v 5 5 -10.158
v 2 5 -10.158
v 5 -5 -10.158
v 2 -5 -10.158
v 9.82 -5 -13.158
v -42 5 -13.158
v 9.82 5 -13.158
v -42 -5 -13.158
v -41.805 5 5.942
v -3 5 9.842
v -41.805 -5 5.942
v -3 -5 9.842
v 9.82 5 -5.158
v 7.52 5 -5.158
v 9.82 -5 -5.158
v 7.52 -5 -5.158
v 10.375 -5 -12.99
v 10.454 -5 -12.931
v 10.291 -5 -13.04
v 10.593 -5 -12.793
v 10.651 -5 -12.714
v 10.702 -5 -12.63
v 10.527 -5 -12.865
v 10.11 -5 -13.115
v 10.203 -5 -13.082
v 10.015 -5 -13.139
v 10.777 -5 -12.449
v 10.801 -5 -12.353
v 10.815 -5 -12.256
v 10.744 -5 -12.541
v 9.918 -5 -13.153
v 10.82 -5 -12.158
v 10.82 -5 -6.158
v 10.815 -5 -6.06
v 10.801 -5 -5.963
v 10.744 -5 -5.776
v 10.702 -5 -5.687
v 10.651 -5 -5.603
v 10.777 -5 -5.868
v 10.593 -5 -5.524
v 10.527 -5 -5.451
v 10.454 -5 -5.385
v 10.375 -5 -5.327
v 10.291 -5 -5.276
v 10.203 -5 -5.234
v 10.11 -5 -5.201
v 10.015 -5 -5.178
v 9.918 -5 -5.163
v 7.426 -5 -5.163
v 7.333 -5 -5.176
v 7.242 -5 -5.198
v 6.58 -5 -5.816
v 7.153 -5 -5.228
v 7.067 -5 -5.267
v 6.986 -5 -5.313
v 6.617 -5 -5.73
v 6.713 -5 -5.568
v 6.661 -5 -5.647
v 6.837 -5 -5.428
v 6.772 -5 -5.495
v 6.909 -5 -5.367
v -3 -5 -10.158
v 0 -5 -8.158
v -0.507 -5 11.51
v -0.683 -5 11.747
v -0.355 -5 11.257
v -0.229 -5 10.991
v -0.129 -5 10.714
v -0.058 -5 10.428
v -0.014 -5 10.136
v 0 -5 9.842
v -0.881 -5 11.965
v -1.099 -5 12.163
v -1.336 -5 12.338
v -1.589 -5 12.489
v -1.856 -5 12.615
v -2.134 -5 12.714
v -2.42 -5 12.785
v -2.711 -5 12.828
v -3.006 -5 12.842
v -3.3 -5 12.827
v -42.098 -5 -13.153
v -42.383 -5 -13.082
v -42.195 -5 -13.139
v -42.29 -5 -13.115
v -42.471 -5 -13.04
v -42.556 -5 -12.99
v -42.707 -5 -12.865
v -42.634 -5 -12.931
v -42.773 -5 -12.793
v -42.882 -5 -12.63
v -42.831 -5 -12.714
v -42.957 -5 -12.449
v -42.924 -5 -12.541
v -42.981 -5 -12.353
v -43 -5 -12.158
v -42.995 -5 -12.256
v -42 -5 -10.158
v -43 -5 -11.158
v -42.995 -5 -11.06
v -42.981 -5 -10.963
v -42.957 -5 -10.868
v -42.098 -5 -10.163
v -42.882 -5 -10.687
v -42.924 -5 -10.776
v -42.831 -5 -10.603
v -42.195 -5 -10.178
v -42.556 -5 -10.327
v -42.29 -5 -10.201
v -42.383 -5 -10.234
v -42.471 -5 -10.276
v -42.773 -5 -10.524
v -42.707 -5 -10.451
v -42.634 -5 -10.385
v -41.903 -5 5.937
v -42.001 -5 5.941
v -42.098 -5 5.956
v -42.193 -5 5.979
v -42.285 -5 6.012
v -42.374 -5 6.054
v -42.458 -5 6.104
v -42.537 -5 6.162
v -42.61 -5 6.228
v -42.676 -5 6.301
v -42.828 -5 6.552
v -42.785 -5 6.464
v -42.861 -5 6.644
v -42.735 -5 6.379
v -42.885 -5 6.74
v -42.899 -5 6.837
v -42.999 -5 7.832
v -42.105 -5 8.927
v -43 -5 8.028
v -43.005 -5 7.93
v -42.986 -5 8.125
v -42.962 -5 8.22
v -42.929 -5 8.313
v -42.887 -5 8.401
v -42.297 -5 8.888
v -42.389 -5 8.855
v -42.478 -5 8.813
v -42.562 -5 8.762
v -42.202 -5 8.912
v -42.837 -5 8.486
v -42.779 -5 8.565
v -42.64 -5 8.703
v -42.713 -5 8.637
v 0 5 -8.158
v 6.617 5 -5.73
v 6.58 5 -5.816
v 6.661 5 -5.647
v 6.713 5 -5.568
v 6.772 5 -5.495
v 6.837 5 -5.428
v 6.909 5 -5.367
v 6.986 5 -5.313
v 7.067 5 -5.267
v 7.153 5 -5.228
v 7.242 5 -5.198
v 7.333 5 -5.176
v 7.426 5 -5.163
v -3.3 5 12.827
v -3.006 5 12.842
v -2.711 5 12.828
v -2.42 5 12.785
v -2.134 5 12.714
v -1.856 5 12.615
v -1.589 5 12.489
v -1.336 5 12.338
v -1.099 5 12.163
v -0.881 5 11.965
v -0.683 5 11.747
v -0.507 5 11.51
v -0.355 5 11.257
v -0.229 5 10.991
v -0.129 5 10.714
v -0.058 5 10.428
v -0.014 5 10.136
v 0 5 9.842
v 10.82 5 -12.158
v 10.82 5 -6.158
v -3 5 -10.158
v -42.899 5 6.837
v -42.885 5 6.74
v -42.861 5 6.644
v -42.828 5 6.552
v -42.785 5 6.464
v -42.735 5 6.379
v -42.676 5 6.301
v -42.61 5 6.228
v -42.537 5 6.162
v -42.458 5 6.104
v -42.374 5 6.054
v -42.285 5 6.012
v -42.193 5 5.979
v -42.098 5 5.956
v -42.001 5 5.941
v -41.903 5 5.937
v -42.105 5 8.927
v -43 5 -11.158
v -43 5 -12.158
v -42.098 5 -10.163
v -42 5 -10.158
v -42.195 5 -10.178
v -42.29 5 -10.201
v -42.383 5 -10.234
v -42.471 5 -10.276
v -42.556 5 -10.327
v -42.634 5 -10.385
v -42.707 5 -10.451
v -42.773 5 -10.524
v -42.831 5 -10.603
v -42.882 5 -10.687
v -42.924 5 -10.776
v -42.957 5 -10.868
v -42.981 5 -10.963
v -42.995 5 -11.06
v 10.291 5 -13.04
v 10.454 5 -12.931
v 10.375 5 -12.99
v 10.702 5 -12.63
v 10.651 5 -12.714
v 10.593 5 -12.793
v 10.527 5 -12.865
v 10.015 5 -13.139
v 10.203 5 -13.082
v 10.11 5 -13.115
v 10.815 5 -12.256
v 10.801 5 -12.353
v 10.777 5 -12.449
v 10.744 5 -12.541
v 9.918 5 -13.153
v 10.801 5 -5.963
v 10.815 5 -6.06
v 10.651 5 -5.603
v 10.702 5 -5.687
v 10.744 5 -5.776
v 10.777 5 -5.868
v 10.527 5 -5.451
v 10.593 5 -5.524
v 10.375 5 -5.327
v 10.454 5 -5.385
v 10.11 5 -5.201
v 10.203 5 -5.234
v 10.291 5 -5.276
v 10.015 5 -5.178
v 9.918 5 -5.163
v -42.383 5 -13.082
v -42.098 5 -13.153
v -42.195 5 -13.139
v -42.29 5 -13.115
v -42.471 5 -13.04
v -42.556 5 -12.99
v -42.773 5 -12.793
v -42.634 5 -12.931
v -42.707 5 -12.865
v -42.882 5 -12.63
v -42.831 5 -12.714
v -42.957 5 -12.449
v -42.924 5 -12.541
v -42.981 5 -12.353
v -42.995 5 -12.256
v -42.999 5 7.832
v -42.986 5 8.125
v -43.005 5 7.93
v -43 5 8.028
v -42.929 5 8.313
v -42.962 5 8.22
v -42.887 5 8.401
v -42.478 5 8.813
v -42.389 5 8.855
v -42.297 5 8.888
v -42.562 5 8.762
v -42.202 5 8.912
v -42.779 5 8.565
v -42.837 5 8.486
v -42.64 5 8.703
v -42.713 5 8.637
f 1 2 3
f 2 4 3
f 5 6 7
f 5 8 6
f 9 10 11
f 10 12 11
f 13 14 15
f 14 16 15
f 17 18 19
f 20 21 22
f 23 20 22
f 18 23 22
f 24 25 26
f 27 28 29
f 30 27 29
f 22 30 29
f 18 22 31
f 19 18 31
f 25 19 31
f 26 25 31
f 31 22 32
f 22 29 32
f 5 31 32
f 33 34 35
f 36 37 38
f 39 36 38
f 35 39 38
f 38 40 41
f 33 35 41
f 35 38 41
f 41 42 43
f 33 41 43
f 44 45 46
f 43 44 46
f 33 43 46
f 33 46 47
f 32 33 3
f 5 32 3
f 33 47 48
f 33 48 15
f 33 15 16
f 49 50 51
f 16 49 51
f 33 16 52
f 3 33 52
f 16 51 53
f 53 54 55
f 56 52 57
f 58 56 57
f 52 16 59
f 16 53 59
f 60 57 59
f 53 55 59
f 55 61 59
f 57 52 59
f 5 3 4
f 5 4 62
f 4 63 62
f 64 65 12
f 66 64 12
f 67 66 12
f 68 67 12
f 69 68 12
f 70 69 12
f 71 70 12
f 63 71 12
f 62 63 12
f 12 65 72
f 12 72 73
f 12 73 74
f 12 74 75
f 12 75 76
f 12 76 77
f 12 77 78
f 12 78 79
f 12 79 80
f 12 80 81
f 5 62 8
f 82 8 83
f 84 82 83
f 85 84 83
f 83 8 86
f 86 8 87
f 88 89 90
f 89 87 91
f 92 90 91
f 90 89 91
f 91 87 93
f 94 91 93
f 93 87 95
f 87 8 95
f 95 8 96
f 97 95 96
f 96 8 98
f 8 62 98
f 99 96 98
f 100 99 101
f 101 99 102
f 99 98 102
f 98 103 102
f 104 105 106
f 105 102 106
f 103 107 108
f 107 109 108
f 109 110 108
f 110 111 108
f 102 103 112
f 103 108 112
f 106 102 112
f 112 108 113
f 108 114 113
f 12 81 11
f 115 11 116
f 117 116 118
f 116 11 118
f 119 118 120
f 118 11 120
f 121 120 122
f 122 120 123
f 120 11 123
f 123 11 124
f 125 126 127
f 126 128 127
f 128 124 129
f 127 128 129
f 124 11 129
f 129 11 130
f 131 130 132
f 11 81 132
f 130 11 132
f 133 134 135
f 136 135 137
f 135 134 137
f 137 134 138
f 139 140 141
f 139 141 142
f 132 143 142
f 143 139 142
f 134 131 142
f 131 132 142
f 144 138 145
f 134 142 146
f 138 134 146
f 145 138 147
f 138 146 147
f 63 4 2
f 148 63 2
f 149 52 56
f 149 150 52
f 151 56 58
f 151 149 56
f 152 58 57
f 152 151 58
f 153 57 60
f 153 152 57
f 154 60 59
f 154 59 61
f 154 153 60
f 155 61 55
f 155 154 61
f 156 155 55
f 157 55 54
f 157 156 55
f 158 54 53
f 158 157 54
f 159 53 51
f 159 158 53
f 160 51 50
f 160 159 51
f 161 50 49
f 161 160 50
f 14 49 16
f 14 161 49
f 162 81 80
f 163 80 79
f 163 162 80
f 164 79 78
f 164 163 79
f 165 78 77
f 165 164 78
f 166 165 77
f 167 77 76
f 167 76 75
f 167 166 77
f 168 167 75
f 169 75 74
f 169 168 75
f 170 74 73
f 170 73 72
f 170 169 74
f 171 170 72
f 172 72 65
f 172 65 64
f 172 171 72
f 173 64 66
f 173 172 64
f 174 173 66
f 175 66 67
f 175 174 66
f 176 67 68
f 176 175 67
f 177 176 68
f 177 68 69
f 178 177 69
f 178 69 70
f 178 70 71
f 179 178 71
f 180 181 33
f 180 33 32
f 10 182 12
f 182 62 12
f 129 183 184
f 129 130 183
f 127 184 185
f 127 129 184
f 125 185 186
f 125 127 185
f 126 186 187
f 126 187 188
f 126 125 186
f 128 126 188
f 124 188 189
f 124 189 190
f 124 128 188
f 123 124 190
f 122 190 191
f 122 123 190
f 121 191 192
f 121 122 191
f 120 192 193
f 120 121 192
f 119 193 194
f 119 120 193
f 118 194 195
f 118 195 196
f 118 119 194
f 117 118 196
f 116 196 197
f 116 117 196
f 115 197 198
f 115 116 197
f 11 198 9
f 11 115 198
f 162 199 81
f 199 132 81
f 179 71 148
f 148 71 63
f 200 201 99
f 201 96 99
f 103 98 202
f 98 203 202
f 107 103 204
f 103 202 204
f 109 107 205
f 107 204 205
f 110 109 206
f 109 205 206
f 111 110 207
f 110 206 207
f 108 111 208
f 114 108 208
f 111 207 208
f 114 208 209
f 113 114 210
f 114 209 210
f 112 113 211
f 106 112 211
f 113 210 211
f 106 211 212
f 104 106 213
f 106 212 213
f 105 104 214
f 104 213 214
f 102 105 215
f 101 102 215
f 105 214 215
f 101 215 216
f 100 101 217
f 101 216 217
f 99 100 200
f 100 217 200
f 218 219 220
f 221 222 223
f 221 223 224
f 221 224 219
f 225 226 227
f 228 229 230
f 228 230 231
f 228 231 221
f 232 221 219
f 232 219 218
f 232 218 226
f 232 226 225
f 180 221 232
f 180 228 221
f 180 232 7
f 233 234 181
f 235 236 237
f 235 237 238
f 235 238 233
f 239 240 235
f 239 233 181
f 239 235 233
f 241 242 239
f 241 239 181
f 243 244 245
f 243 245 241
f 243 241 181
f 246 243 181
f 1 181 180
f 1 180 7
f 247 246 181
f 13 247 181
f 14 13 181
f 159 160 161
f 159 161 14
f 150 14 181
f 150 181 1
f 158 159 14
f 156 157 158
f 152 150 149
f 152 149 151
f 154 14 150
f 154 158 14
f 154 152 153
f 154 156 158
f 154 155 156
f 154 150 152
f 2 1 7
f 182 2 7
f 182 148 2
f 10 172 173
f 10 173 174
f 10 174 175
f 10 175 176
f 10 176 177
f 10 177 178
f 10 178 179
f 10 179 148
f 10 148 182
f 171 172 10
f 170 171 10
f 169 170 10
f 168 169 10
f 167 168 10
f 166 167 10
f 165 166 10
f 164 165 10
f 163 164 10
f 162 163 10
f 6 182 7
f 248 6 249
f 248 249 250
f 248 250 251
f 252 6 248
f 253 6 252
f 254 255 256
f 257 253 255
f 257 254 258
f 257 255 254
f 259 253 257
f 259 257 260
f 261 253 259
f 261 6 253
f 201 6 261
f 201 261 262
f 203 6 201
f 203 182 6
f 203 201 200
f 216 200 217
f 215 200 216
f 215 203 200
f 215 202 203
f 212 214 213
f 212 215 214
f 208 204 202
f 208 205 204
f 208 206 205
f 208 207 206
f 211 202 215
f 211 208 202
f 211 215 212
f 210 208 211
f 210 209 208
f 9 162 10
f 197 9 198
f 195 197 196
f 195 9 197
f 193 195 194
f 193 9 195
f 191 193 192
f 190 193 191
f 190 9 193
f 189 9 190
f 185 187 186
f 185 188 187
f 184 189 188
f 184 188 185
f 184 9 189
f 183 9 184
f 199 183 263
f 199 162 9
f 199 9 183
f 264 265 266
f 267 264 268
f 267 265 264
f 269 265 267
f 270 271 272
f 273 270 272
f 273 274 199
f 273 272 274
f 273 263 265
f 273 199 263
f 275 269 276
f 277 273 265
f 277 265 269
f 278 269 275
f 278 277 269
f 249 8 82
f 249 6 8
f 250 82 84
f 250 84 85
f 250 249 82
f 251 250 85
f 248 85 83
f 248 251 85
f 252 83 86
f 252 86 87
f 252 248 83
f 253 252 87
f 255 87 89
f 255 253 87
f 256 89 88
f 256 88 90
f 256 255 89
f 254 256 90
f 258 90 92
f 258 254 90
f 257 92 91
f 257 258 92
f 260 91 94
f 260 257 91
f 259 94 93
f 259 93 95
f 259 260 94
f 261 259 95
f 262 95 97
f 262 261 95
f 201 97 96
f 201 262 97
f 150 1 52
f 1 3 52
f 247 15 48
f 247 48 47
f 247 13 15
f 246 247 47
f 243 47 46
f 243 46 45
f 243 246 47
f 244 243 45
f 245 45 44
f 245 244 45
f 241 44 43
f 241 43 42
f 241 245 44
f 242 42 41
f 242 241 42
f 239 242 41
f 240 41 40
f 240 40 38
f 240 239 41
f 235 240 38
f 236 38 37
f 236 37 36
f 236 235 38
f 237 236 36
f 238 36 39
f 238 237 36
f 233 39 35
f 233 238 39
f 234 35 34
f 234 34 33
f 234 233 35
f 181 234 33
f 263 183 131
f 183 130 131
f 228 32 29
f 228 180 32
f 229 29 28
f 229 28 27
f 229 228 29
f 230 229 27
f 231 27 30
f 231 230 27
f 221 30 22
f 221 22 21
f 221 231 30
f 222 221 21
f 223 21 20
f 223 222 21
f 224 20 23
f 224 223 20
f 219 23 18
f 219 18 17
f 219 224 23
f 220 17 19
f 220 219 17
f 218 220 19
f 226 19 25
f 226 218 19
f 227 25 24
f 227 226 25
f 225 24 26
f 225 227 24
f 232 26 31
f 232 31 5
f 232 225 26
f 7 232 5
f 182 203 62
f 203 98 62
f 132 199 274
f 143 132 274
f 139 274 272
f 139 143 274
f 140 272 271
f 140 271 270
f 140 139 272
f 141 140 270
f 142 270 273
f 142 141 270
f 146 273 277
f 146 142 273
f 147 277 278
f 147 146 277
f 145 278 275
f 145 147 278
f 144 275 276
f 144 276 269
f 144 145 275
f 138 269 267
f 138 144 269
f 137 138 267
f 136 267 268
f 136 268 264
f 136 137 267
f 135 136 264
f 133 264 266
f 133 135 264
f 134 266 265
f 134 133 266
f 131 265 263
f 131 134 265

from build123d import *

# Parameters (mm, degrees)
PAD_DEPTH    = 5
FILLET_R     = 3
CHAMFER_SIZE = 2
FILLET001_R  = 1


with BuildPart() as part:
    # Sketch → Pad (new body, symmetric)
    with BuildSketch(Plane.XZ):
        Polygon((-43.099497, 8.82665), (0, 13.158312), (0, -10.158312), (5, -10.158312), (6.819851, -5.158312), (10.819851, -5.158312), (10.819851, -13.158312), (0, -13.158312), (-43, -13.158312), (-43, -10.158312), (-3, -10.158312), (-3, 9.841688), (-42.799497, 5.841688), align=None)
    extrude(amount=PAD_DEPTH, both=True)

    # Fillet
    fillet_edges = [part.edges().sort_by_distance(p)[0] for p in [
        (0, 0, 13.158312),
    ]]
    fillet(fillet_edges, radius=FILLET_R)

    # Chamfer
    chamfer_edges = [part.edges().sort_by_distance(p)[0] for p in [
        (0, 0, -10.158312),
    ]]
    chamfer(chamfer_edges, length=CHAMFER_SIZE)

    # Fillet001
    fillet001_edges = [part.edges().sort_by_distance(p)[0] for p in [
        (-42.799497, 0, 5.841688),
        (-43.099497, 0, 8.82665),
        (-43, 0, -10.158312),
        (-43, 0, -13.158312),
        (10.819851, 0, -5.158312),
        (6.819851, 0, -5.158312),
        (10.819851, 0, -13.158312),
    ]]
    fillet(fillet001_edges, radius=FILLET001_R)


solid = part.part
